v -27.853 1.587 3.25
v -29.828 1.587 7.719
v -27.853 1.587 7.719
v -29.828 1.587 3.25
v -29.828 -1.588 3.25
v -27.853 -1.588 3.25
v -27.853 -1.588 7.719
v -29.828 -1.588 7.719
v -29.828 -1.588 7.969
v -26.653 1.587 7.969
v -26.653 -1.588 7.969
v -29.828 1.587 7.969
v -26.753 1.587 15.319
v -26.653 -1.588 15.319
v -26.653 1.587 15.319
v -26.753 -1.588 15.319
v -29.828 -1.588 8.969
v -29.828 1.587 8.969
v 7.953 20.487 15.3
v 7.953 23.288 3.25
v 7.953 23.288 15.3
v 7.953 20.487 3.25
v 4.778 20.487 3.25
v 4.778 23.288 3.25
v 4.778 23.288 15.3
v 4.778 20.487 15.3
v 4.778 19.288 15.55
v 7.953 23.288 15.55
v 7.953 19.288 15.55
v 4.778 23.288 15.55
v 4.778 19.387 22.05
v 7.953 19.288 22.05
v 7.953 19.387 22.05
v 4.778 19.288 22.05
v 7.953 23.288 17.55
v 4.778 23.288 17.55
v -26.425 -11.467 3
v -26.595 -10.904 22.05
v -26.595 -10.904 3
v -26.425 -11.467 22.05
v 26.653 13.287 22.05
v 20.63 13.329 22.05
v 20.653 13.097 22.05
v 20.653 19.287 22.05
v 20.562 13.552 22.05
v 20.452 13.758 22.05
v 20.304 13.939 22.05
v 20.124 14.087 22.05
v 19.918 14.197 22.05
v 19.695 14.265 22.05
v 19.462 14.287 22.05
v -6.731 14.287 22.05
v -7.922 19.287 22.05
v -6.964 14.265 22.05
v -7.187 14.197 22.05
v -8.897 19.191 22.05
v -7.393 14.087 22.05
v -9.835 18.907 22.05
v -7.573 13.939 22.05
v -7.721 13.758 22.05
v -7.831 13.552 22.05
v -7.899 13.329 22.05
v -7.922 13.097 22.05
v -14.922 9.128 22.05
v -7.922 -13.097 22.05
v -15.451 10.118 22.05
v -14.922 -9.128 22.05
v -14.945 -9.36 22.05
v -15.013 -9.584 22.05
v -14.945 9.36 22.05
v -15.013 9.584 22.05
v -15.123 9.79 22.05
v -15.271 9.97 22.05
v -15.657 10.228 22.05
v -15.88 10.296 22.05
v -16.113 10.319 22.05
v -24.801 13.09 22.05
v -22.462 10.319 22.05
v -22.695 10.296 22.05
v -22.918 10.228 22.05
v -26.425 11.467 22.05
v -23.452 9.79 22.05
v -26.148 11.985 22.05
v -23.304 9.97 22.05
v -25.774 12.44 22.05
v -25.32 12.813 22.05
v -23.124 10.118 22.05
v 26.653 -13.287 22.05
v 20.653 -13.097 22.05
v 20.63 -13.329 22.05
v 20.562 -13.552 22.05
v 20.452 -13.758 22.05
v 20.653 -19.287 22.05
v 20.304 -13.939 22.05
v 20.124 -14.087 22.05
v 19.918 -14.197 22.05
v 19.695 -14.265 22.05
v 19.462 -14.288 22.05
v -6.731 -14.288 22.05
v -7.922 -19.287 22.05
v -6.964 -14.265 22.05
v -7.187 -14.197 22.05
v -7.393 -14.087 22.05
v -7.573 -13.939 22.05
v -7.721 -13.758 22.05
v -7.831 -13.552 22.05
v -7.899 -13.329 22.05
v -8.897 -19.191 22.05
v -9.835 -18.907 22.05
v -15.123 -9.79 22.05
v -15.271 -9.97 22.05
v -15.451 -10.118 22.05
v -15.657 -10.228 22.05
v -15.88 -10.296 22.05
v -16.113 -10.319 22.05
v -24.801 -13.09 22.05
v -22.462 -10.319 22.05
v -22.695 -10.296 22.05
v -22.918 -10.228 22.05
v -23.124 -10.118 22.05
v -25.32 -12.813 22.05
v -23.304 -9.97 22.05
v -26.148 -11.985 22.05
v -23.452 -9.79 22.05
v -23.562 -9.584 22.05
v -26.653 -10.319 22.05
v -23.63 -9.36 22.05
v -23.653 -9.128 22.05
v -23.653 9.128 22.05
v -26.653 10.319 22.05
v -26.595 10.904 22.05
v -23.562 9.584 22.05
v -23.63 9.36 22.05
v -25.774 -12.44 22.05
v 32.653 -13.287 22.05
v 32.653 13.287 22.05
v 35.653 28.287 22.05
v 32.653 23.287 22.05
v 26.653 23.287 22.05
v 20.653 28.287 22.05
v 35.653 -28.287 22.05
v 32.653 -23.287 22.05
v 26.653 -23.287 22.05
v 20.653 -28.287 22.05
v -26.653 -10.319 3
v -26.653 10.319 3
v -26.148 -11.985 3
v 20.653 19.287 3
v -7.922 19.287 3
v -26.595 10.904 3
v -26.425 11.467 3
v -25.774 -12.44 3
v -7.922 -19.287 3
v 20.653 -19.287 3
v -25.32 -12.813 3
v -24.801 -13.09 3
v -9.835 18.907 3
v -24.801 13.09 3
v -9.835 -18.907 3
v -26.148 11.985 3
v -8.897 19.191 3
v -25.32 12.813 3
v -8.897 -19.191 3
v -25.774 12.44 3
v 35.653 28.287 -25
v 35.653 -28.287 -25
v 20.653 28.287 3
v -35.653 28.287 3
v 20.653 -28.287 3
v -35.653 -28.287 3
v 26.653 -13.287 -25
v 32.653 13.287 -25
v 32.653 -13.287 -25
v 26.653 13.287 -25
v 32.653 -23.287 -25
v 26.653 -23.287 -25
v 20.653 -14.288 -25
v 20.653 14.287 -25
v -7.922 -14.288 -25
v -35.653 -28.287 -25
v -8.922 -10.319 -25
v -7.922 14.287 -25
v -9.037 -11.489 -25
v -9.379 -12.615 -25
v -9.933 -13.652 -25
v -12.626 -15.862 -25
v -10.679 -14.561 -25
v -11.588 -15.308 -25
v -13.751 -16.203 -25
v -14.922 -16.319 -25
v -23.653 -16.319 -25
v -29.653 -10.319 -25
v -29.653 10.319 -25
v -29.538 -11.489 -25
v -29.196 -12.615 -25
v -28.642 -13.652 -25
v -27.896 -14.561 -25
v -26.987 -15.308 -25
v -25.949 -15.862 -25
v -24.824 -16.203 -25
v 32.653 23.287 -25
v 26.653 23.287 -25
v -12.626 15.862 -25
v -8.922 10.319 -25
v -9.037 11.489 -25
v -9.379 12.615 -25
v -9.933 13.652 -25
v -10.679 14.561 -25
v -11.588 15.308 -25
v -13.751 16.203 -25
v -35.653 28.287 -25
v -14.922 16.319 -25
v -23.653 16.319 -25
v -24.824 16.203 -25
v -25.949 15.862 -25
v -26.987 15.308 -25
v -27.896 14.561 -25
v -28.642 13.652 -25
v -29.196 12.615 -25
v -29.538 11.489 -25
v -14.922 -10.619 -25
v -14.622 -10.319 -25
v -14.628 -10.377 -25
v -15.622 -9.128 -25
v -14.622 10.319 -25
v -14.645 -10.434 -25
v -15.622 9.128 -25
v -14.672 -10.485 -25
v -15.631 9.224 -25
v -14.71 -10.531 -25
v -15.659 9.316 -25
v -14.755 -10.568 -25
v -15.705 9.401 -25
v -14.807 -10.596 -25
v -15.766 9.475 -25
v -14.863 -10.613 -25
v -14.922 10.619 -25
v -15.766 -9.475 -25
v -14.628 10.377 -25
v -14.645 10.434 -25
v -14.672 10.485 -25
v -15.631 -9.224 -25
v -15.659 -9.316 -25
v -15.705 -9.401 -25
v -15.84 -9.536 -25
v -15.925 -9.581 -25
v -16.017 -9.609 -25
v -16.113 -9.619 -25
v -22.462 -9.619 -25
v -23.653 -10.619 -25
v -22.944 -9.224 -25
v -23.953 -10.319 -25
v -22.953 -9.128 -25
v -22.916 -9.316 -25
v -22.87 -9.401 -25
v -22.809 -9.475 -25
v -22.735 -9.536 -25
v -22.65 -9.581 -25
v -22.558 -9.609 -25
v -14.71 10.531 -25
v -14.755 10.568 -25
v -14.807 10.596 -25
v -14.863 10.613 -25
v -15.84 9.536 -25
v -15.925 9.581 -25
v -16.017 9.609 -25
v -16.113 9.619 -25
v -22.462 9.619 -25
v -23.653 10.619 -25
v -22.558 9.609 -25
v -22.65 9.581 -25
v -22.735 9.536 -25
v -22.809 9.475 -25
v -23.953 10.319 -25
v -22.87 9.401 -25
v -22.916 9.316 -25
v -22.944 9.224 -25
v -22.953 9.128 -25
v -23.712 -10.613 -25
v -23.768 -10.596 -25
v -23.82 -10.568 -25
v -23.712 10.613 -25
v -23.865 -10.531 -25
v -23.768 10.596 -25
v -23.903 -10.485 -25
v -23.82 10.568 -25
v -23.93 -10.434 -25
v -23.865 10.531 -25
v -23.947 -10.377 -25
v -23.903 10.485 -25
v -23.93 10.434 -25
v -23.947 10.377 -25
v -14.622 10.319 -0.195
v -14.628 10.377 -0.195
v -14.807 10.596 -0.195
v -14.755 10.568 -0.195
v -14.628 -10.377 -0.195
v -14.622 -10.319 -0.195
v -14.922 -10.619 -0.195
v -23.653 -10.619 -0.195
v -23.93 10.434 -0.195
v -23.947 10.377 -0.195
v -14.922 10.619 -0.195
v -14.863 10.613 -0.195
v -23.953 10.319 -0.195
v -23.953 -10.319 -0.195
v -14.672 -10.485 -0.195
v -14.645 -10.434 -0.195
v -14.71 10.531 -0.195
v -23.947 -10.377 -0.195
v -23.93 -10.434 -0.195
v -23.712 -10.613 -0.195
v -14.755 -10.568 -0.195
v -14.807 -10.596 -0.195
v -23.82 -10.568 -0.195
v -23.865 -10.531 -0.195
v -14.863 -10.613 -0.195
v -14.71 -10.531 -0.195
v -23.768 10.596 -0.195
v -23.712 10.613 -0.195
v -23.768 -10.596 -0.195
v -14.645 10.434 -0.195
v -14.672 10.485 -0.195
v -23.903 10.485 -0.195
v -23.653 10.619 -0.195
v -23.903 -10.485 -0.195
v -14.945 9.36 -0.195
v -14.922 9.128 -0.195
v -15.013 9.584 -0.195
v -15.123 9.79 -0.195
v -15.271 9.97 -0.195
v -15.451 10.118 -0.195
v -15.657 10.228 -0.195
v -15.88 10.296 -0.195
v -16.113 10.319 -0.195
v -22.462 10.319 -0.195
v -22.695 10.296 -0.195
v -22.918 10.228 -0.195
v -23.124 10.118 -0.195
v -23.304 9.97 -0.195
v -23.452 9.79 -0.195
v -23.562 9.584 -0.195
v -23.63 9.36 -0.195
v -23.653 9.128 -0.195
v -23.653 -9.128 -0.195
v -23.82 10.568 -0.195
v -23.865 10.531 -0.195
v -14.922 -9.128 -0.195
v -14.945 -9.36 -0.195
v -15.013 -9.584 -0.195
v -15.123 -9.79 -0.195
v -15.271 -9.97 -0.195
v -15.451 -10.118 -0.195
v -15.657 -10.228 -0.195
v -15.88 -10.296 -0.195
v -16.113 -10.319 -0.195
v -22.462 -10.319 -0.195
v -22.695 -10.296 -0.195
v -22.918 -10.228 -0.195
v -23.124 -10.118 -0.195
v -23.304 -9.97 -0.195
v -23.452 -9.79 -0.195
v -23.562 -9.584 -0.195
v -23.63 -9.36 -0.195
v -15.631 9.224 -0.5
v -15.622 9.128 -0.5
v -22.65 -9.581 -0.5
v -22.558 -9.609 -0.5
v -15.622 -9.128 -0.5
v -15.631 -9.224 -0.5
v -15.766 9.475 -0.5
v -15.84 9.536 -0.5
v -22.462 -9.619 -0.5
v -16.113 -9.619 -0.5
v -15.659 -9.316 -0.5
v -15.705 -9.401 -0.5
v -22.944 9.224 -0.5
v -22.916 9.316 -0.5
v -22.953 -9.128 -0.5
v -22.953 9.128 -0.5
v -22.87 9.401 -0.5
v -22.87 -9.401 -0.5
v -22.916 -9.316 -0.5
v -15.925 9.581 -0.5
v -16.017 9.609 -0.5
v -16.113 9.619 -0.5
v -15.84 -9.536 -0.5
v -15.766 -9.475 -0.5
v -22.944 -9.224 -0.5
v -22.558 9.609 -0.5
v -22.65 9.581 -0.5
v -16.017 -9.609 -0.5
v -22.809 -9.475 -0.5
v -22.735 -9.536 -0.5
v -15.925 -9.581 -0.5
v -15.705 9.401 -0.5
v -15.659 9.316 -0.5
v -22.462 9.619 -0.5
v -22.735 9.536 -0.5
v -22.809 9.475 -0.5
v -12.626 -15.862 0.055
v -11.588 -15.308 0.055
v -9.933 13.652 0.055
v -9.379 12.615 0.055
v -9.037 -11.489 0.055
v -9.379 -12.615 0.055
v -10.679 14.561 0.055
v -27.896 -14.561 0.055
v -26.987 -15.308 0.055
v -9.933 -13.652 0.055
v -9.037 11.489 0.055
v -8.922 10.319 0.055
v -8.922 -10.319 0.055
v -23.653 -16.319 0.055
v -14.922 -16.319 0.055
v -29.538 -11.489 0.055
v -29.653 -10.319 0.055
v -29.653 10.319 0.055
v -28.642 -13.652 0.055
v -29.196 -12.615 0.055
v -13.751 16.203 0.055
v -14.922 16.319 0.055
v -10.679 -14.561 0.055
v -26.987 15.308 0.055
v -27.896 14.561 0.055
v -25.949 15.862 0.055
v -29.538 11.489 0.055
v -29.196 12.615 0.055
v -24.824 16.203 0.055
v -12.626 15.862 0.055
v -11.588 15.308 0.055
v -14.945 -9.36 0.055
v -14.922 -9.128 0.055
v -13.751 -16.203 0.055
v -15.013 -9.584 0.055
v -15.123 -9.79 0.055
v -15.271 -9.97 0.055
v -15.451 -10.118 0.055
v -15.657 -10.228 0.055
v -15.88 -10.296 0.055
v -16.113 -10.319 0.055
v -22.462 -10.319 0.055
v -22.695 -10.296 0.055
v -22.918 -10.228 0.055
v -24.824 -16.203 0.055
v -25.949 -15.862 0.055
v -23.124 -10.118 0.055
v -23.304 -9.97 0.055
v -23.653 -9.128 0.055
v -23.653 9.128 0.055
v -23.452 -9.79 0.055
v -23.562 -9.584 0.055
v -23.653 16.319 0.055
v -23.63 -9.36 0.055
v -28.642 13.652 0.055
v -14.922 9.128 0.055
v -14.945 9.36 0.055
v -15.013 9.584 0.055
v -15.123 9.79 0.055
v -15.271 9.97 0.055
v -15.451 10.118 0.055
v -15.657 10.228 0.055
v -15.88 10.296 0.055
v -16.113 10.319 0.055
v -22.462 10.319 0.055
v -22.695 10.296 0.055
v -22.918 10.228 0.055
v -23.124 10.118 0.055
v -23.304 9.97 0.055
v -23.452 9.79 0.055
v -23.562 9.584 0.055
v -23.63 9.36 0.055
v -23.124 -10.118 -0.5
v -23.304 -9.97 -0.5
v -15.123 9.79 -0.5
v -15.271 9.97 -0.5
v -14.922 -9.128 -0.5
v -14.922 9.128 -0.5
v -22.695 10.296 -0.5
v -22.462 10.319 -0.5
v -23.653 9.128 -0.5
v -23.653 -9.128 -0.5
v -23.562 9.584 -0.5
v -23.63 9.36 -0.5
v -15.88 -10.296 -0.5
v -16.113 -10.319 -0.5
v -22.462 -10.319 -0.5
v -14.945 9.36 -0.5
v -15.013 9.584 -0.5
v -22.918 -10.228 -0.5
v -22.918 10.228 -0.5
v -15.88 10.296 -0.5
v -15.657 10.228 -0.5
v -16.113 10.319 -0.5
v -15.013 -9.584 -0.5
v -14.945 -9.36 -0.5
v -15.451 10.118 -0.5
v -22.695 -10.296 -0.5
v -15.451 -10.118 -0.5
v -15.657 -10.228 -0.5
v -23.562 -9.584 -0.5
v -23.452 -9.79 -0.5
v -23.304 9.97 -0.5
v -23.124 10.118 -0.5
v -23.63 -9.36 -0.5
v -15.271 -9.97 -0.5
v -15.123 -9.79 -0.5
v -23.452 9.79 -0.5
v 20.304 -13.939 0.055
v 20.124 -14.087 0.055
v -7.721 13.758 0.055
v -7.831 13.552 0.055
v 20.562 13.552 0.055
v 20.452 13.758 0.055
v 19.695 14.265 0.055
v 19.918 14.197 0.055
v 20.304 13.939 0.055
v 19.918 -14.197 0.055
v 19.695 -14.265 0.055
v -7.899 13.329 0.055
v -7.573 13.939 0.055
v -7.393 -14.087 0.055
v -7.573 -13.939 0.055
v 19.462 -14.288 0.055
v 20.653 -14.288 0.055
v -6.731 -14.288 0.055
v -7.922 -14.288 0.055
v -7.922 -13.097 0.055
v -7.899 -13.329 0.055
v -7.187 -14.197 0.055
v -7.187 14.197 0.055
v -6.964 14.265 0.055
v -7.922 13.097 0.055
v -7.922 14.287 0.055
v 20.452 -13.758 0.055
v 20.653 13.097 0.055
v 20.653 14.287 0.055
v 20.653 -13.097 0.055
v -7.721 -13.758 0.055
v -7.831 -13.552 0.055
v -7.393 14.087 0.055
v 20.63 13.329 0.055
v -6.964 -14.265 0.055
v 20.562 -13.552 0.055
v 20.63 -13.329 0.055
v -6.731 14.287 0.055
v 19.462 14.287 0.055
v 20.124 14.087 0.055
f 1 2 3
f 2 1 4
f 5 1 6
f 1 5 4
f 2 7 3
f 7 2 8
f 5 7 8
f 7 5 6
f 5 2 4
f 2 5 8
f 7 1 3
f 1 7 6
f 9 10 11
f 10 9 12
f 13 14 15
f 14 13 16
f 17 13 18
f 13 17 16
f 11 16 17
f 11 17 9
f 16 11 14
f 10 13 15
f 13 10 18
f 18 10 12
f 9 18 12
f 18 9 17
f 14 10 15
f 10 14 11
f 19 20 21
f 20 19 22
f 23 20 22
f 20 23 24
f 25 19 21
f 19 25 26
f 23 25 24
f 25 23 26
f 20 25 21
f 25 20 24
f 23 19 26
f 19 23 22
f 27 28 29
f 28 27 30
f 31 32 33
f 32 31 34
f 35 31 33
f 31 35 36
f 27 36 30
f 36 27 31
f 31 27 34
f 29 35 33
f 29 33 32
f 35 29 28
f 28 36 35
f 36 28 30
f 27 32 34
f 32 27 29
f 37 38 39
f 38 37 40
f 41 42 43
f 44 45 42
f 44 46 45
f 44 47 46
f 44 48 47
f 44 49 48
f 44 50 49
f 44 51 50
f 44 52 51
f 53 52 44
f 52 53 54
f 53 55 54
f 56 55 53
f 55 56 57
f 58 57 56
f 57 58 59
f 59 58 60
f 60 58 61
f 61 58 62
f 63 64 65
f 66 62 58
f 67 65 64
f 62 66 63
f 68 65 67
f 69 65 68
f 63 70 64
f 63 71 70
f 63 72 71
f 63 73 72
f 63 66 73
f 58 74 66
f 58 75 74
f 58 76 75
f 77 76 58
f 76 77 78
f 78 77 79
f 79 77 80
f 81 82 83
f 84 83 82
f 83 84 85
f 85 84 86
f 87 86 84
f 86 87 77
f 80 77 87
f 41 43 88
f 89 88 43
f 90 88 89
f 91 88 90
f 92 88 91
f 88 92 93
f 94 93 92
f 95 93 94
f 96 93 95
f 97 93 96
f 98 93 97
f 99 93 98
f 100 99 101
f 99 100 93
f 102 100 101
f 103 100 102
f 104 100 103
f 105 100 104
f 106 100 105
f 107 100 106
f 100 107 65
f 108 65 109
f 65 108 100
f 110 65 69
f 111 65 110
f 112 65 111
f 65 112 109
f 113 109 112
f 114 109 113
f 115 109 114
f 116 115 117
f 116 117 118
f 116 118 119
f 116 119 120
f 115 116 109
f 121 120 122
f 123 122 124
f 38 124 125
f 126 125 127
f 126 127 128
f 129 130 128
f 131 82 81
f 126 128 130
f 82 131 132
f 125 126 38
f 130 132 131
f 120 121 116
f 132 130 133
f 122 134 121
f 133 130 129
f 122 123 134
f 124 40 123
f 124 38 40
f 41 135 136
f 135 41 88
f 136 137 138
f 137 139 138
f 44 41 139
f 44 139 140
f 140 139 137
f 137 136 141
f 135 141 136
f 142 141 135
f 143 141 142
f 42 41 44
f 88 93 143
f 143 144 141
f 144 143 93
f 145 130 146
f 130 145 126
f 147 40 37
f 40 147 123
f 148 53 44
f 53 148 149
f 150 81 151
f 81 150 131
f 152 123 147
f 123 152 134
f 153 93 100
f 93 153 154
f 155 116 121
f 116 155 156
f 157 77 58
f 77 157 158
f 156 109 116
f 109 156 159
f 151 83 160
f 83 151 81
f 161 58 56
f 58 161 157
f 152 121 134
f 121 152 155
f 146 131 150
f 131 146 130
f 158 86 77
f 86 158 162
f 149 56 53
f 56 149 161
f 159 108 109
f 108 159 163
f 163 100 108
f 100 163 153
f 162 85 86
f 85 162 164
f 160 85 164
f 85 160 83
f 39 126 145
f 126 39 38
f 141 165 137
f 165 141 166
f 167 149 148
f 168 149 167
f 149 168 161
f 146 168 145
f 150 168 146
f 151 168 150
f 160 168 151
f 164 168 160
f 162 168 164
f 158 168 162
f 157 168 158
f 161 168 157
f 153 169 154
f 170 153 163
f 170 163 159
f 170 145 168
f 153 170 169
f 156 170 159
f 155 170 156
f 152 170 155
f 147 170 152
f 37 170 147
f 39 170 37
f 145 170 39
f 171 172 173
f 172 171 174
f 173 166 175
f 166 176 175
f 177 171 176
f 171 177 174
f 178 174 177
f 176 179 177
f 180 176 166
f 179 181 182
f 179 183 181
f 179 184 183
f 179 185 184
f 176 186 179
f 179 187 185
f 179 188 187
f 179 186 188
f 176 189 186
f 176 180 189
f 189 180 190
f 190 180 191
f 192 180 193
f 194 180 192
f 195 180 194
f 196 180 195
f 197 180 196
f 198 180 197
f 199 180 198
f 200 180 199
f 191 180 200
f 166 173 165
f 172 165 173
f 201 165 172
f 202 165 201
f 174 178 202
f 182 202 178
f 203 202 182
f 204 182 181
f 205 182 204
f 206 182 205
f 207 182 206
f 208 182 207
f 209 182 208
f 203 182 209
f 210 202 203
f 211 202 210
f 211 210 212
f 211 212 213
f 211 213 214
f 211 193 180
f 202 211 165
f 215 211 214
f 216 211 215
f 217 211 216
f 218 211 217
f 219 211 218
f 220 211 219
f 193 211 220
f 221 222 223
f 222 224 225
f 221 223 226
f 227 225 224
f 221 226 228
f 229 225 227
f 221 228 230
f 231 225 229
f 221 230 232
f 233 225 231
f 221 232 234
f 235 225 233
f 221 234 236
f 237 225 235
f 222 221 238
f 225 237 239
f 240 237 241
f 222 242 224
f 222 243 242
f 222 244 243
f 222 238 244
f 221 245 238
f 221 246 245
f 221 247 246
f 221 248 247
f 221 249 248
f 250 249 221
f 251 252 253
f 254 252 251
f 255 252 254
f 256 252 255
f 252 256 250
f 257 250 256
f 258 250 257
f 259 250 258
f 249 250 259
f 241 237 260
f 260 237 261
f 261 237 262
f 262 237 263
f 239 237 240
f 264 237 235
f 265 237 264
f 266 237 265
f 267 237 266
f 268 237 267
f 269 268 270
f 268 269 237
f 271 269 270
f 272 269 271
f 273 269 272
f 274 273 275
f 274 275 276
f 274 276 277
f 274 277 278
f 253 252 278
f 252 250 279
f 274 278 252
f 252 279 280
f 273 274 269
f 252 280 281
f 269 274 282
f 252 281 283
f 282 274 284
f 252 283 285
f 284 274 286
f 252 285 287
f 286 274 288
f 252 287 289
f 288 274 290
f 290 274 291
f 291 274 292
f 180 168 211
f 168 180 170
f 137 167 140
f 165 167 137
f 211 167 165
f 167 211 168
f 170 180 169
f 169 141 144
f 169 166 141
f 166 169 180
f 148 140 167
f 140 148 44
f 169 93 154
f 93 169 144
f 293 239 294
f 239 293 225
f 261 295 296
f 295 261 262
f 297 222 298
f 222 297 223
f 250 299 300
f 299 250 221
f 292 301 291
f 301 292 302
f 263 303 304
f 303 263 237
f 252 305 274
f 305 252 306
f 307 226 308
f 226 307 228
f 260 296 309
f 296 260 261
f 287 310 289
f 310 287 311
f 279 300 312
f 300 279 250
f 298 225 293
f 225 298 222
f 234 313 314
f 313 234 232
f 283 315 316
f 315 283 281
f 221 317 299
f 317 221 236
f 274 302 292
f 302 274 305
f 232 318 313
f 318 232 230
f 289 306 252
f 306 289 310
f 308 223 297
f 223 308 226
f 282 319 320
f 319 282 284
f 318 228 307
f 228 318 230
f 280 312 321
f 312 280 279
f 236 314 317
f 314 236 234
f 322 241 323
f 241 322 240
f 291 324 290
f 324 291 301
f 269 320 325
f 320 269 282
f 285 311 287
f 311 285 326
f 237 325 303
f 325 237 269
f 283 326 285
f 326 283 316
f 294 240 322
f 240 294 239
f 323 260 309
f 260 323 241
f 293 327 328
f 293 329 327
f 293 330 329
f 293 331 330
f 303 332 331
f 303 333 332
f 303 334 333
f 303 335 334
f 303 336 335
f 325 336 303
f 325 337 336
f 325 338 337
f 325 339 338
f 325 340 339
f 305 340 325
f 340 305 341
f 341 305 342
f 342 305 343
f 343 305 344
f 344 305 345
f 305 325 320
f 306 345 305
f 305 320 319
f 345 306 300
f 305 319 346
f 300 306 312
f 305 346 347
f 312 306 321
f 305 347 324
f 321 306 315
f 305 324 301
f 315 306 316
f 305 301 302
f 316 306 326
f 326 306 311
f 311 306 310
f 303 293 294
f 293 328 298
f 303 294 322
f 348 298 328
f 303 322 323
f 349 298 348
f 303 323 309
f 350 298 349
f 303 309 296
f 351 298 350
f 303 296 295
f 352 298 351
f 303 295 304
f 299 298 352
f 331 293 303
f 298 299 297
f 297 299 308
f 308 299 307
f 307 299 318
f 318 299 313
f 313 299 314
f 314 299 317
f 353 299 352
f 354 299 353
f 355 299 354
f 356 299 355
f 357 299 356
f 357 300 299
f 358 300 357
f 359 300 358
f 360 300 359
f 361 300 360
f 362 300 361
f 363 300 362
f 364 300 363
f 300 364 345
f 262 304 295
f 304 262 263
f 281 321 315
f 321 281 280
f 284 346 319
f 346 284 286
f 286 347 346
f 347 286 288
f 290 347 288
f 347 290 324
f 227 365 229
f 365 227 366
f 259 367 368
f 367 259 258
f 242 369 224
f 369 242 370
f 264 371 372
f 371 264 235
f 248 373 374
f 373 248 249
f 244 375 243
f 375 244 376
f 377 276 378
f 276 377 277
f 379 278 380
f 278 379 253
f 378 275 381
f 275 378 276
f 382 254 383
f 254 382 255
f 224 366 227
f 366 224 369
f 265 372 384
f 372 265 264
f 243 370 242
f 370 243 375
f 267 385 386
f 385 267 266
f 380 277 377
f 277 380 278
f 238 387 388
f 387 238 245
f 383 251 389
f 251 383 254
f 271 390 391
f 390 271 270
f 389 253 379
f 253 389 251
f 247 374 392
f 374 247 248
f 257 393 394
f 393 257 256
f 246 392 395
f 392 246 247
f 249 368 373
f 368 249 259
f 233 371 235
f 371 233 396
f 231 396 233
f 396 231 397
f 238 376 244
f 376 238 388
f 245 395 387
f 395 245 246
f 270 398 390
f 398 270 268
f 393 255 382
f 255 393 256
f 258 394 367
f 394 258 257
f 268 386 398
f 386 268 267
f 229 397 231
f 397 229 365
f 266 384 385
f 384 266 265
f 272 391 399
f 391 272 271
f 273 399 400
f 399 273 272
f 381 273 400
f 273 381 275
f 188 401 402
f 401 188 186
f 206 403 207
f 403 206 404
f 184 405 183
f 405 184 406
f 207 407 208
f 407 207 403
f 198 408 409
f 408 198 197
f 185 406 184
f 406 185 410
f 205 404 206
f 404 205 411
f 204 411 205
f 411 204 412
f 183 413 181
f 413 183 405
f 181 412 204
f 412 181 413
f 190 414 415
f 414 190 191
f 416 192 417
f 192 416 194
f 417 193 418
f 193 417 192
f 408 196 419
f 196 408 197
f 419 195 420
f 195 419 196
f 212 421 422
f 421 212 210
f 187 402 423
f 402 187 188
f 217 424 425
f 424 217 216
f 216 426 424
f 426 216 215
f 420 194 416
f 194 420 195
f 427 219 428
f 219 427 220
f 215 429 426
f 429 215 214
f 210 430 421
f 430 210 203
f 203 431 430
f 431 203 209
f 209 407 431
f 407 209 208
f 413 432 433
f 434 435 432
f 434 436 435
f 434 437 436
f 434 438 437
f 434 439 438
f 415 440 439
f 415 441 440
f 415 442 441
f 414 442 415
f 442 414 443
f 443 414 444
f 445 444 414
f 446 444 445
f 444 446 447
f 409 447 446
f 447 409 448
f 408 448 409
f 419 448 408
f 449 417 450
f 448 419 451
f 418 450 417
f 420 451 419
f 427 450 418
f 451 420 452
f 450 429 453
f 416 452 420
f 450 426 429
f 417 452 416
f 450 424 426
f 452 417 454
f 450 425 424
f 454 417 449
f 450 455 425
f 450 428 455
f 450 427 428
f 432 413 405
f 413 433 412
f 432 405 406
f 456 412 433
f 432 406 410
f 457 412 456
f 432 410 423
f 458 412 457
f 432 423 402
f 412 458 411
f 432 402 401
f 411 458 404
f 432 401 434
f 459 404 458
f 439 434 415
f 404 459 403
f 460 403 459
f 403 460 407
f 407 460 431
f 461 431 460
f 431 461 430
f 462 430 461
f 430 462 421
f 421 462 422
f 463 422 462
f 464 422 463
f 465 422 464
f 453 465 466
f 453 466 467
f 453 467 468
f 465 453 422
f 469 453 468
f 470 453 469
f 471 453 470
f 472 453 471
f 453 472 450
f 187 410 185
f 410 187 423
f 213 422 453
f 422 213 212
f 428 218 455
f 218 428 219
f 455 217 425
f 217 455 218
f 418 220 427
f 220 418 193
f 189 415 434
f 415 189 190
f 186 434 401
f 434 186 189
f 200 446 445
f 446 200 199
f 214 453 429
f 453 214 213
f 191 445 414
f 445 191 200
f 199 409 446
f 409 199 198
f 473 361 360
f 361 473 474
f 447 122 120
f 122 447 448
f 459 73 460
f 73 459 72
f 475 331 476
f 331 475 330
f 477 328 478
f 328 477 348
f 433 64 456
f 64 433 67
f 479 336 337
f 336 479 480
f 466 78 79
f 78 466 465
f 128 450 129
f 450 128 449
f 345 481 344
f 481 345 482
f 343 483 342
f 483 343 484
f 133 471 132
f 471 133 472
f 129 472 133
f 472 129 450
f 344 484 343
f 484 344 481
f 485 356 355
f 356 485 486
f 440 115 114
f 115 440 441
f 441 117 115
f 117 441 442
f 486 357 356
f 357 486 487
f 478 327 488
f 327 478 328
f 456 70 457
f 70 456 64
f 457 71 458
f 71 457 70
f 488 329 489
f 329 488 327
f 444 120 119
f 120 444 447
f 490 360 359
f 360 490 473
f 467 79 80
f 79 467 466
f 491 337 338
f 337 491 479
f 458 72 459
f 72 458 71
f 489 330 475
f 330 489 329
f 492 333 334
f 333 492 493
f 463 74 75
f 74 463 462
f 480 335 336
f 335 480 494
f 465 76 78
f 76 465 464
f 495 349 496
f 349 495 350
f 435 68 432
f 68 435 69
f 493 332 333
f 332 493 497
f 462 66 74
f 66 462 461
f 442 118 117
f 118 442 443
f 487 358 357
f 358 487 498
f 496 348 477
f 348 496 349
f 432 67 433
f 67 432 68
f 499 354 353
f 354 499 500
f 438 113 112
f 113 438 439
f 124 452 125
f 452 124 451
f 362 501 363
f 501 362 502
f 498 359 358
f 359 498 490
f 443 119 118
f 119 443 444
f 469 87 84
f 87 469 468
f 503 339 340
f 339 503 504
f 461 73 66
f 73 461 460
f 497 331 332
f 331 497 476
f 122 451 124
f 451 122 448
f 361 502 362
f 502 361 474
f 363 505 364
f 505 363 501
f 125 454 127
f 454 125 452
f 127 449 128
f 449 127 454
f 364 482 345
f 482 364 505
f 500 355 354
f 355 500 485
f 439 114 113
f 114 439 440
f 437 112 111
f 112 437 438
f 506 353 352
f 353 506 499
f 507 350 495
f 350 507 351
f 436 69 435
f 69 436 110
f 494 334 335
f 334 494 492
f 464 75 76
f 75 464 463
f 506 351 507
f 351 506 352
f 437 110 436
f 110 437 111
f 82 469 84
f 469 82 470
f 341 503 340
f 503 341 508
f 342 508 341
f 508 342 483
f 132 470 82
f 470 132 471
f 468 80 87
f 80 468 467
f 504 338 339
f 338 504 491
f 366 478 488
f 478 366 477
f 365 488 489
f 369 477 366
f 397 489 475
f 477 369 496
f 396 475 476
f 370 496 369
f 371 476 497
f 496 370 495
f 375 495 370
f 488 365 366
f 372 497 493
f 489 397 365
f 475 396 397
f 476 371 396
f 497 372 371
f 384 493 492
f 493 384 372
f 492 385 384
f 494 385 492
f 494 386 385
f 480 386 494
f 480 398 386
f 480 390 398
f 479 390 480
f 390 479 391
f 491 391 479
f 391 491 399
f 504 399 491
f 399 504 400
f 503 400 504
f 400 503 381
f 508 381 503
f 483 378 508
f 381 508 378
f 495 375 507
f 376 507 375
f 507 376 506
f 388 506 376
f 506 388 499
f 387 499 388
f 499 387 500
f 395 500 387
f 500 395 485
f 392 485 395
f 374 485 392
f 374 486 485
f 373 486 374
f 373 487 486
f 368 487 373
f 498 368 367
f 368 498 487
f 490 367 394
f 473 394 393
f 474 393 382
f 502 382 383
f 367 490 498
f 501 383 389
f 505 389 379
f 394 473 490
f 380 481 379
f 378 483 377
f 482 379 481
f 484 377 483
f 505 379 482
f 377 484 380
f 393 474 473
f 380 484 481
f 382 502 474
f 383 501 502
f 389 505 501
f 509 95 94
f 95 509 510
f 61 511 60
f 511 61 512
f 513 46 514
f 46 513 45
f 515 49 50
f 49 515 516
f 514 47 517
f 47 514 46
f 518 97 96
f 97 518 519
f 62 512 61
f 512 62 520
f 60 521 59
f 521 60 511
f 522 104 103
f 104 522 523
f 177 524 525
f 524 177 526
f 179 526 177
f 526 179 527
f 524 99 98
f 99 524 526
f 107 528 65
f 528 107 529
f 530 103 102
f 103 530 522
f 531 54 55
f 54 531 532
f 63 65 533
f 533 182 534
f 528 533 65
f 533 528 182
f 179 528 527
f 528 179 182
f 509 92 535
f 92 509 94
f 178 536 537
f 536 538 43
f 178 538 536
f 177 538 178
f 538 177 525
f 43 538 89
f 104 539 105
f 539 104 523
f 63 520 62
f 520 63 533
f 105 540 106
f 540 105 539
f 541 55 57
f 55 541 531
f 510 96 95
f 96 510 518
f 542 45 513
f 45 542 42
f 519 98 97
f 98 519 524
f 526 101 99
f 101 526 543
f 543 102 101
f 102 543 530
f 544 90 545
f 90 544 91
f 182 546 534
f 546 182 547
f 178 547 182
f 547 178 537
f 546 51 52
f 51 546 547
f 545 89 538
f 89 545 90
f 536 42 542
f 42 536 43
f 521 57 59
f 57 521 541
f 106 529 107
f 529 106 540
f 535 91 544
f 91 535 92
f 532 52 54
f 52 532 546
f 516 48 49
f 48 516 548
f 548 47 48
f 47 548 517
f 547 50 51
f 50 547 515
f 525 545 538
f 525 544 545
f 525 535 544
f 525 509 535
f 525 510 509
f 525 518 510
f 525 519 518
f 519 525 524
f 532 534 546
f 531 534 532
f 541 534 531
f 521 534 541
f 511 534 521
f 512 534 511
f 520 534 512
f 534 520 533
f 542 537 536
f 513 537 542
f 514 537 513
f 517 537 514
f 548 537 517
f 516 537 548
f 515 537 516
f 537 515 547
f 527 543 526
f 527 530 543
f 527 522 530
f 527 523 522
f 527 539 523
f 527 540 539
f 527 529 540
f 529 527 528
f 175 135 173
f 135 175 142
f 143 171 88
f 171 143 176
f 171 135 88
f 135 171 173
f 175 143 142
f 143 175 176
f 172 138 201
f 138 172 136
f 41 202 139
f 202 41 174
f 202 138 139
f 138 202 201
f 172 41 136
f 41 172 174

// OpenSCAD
// file: relay.scad
function relayx() = 9/8*25.4;
function relayy() = 9/8*25.4;
function relaywall() = 5;
module relay(d=3,s=1,e=0,er=0) {
    x=relayx();
    y=relayy();
    z=3/4*25.4;
    tx=1/8*25.4;
    tz=2;
    ty=4;
    tsz=4.5;
    th=0;
    r=3/64*25.4;
    w=relaywall();
    $fn=32;
    translate([-x/2,-y/2,z+d])
    mirror([0,0,1])
    if (s==2) {
        translate([x/2-tx/2,y+w,th]) translate([0,1.2,tz+tsz+.25]) cube([tx,ty-1.2,z-d*1.5-tz-0.5]);
        translate([x/2-tx/2,y+w,th]) hull() {
            translate([0,0,tsz]) cube([tx,ty,tz]);
            cube([tx,0.1,.1]);
        }
    } else if (s==1) {
        linear_extrude(z+d) offset(r=w) square([x,y]);
    } else {
        translate([0,0,-0.005]) linear_extrude(z+d+0.01) offset(r=r) offset(r=-r) square([x,y]);
        if (e>0) {
            difference() {
                translate([0,0,e-d-0.005]) linear_extrude(e+d) offset(r=er) square([x,y]);
                if (er>=1) {
                    difference() {
                        translate([0,0,.25+e-d-0.005]) linear_extrude(e+d-.25) offset(r=0.3) square([x,y]);
                        translate([0,0,e-d-0.005]) linear_extrude(e+d+.25) offset(r=r+.7) offset(r=-r) square([x,y]);
                    }
                }
            }
        }
    }
}

module test () {
    translate([0,-y/2-w-1]) difference() {
        union() {
            translate([0,0,-14+1.5]) cube([relayx()+2*relaywall()+10,relayy()+2*relaywall()+10,28],true);
            relay(d=3,s=1);
            relay(d=3,s=2);
        }
        relay(d=3,s=0,e=25,er=1);
    }
}
test();
// file: fuse.scad
gap=0.3;
function fusex() = 13/16*25.4;
function fusey() = 11/32*25.4;
function fusewall() = 3;
module fuse(d=3,s=1,e=0,er=0) {
    x=fusex();
    y=fusey();
    z=3/4*25.4;
    tx=1/8*25.4;
    tz=1;
    ty=1/8*25.4;
    tsz=2*ty;
    th=(11/32)*25.4-2;
    r=3/64*25.4;
    w=fusewall();
    $fn=32;
    translate([-x/2,-y/2,z+d])
    mirror([0,0,1])
    if (s==2) {
        translate([x/2-tx/2,y+w,th]) translate([0,1.2,tsz+tz+.25]) cube([tx,ty-1.2,z-th-tsz-tz-0.5]);
        translate([x/2-tx/2,y+w,th]) hull() {
            translate([0,0,tsz]) cube([tx,ty,tz]);
            cube([tx,0.1,.1]);
        }
    } else if (s==1) {
        linear_extrude(z+d) offset(r=w) square([x,y]);
    } else {
        translate([0,0,-0.5]) linear_extrude(z+d+1) offset(r=r) offset(r=-r) square([x,y]);
        if (e>0) {
            difference() {
                translate([0,0,e-d-0.005]) linear_extrude(e+d+0.56) offset(r=er) square([x,y]);
                if (er>=1) {
                    difference() {
                        translate([0,0,0.25+e-d-0.005]) linear_extrude(e+d+0.56-.25) offset(r=.3) square([x,y]);
                        translate([0,0,e-d-0.005]) linear_extrude(e+d+0.56+.25) offset(r=r-.7) offset(r=-r) square([x,y]);
                    }
                }
            }
        }
    }
}

module test() {
    difference() {
        union() {
            translate([0,0,-14+3]) cube([fusex()+fusewall()+10,fusey()+fusewall()+10,25+3],true);
            fuse(3,1);
            fuse(3,2);
        }
        fuse(3,0,25,3);
    }
}
test();
// main file
use <fuse.scad>;
use <relay.scad>;

cubex=20+fusey()+6+relayx()+8;
cubey=relayy()+8+20;
cubez=28;
zipw=10;
zipt=6;
blockface=25;
difference() {
    union() {
        translate([0,0,-cubez/2+3]) cube([cubex,cubey,cubez],true);
        translate([cubex/2-zipt/2-3-1.5,0,-cubez/2+3+3/4*25.4/2]) cube([zipt+6+3,cubey,cubez+3/4*25.4],true);
        translate([(-fusey()-6+relayx()+8)/-2-1,0]) union() {
            hull() {                    
                translate([-fusey()/2-3,0,0]) rotate(90) fuse(d=3,s=1);
                translate([relayx()/2+4,0,0]) relay(d=3,s=1);
            }
            translate([-fusey()/2-3,0,0]) rotate(90) fuse(d=3,s=2);
            translate([relayx()/2+4,0,0]) relay(d=3,s=2);
        }
    }
    translate([(-fusey()-6+relayx()+8)/-2-1,0]) union() {
        translate([-fusey()/2-3,0,0]) rotate(90) fuse(d=3,s=0,s=0,e=25,er=6);
        translate([relayx()/2+4,0,0]) relay(d=3,s=0,e=25,er=0);
    }
    #for (i=[-1,1]) translate([cubex/2-zipt/2-3,i*(cubey/2-zipw/2-5),-cubez/2+3+3/4*25.4/2]) cube([zipt,zipw,cubez+3/4*25.4+.002],true);
}
